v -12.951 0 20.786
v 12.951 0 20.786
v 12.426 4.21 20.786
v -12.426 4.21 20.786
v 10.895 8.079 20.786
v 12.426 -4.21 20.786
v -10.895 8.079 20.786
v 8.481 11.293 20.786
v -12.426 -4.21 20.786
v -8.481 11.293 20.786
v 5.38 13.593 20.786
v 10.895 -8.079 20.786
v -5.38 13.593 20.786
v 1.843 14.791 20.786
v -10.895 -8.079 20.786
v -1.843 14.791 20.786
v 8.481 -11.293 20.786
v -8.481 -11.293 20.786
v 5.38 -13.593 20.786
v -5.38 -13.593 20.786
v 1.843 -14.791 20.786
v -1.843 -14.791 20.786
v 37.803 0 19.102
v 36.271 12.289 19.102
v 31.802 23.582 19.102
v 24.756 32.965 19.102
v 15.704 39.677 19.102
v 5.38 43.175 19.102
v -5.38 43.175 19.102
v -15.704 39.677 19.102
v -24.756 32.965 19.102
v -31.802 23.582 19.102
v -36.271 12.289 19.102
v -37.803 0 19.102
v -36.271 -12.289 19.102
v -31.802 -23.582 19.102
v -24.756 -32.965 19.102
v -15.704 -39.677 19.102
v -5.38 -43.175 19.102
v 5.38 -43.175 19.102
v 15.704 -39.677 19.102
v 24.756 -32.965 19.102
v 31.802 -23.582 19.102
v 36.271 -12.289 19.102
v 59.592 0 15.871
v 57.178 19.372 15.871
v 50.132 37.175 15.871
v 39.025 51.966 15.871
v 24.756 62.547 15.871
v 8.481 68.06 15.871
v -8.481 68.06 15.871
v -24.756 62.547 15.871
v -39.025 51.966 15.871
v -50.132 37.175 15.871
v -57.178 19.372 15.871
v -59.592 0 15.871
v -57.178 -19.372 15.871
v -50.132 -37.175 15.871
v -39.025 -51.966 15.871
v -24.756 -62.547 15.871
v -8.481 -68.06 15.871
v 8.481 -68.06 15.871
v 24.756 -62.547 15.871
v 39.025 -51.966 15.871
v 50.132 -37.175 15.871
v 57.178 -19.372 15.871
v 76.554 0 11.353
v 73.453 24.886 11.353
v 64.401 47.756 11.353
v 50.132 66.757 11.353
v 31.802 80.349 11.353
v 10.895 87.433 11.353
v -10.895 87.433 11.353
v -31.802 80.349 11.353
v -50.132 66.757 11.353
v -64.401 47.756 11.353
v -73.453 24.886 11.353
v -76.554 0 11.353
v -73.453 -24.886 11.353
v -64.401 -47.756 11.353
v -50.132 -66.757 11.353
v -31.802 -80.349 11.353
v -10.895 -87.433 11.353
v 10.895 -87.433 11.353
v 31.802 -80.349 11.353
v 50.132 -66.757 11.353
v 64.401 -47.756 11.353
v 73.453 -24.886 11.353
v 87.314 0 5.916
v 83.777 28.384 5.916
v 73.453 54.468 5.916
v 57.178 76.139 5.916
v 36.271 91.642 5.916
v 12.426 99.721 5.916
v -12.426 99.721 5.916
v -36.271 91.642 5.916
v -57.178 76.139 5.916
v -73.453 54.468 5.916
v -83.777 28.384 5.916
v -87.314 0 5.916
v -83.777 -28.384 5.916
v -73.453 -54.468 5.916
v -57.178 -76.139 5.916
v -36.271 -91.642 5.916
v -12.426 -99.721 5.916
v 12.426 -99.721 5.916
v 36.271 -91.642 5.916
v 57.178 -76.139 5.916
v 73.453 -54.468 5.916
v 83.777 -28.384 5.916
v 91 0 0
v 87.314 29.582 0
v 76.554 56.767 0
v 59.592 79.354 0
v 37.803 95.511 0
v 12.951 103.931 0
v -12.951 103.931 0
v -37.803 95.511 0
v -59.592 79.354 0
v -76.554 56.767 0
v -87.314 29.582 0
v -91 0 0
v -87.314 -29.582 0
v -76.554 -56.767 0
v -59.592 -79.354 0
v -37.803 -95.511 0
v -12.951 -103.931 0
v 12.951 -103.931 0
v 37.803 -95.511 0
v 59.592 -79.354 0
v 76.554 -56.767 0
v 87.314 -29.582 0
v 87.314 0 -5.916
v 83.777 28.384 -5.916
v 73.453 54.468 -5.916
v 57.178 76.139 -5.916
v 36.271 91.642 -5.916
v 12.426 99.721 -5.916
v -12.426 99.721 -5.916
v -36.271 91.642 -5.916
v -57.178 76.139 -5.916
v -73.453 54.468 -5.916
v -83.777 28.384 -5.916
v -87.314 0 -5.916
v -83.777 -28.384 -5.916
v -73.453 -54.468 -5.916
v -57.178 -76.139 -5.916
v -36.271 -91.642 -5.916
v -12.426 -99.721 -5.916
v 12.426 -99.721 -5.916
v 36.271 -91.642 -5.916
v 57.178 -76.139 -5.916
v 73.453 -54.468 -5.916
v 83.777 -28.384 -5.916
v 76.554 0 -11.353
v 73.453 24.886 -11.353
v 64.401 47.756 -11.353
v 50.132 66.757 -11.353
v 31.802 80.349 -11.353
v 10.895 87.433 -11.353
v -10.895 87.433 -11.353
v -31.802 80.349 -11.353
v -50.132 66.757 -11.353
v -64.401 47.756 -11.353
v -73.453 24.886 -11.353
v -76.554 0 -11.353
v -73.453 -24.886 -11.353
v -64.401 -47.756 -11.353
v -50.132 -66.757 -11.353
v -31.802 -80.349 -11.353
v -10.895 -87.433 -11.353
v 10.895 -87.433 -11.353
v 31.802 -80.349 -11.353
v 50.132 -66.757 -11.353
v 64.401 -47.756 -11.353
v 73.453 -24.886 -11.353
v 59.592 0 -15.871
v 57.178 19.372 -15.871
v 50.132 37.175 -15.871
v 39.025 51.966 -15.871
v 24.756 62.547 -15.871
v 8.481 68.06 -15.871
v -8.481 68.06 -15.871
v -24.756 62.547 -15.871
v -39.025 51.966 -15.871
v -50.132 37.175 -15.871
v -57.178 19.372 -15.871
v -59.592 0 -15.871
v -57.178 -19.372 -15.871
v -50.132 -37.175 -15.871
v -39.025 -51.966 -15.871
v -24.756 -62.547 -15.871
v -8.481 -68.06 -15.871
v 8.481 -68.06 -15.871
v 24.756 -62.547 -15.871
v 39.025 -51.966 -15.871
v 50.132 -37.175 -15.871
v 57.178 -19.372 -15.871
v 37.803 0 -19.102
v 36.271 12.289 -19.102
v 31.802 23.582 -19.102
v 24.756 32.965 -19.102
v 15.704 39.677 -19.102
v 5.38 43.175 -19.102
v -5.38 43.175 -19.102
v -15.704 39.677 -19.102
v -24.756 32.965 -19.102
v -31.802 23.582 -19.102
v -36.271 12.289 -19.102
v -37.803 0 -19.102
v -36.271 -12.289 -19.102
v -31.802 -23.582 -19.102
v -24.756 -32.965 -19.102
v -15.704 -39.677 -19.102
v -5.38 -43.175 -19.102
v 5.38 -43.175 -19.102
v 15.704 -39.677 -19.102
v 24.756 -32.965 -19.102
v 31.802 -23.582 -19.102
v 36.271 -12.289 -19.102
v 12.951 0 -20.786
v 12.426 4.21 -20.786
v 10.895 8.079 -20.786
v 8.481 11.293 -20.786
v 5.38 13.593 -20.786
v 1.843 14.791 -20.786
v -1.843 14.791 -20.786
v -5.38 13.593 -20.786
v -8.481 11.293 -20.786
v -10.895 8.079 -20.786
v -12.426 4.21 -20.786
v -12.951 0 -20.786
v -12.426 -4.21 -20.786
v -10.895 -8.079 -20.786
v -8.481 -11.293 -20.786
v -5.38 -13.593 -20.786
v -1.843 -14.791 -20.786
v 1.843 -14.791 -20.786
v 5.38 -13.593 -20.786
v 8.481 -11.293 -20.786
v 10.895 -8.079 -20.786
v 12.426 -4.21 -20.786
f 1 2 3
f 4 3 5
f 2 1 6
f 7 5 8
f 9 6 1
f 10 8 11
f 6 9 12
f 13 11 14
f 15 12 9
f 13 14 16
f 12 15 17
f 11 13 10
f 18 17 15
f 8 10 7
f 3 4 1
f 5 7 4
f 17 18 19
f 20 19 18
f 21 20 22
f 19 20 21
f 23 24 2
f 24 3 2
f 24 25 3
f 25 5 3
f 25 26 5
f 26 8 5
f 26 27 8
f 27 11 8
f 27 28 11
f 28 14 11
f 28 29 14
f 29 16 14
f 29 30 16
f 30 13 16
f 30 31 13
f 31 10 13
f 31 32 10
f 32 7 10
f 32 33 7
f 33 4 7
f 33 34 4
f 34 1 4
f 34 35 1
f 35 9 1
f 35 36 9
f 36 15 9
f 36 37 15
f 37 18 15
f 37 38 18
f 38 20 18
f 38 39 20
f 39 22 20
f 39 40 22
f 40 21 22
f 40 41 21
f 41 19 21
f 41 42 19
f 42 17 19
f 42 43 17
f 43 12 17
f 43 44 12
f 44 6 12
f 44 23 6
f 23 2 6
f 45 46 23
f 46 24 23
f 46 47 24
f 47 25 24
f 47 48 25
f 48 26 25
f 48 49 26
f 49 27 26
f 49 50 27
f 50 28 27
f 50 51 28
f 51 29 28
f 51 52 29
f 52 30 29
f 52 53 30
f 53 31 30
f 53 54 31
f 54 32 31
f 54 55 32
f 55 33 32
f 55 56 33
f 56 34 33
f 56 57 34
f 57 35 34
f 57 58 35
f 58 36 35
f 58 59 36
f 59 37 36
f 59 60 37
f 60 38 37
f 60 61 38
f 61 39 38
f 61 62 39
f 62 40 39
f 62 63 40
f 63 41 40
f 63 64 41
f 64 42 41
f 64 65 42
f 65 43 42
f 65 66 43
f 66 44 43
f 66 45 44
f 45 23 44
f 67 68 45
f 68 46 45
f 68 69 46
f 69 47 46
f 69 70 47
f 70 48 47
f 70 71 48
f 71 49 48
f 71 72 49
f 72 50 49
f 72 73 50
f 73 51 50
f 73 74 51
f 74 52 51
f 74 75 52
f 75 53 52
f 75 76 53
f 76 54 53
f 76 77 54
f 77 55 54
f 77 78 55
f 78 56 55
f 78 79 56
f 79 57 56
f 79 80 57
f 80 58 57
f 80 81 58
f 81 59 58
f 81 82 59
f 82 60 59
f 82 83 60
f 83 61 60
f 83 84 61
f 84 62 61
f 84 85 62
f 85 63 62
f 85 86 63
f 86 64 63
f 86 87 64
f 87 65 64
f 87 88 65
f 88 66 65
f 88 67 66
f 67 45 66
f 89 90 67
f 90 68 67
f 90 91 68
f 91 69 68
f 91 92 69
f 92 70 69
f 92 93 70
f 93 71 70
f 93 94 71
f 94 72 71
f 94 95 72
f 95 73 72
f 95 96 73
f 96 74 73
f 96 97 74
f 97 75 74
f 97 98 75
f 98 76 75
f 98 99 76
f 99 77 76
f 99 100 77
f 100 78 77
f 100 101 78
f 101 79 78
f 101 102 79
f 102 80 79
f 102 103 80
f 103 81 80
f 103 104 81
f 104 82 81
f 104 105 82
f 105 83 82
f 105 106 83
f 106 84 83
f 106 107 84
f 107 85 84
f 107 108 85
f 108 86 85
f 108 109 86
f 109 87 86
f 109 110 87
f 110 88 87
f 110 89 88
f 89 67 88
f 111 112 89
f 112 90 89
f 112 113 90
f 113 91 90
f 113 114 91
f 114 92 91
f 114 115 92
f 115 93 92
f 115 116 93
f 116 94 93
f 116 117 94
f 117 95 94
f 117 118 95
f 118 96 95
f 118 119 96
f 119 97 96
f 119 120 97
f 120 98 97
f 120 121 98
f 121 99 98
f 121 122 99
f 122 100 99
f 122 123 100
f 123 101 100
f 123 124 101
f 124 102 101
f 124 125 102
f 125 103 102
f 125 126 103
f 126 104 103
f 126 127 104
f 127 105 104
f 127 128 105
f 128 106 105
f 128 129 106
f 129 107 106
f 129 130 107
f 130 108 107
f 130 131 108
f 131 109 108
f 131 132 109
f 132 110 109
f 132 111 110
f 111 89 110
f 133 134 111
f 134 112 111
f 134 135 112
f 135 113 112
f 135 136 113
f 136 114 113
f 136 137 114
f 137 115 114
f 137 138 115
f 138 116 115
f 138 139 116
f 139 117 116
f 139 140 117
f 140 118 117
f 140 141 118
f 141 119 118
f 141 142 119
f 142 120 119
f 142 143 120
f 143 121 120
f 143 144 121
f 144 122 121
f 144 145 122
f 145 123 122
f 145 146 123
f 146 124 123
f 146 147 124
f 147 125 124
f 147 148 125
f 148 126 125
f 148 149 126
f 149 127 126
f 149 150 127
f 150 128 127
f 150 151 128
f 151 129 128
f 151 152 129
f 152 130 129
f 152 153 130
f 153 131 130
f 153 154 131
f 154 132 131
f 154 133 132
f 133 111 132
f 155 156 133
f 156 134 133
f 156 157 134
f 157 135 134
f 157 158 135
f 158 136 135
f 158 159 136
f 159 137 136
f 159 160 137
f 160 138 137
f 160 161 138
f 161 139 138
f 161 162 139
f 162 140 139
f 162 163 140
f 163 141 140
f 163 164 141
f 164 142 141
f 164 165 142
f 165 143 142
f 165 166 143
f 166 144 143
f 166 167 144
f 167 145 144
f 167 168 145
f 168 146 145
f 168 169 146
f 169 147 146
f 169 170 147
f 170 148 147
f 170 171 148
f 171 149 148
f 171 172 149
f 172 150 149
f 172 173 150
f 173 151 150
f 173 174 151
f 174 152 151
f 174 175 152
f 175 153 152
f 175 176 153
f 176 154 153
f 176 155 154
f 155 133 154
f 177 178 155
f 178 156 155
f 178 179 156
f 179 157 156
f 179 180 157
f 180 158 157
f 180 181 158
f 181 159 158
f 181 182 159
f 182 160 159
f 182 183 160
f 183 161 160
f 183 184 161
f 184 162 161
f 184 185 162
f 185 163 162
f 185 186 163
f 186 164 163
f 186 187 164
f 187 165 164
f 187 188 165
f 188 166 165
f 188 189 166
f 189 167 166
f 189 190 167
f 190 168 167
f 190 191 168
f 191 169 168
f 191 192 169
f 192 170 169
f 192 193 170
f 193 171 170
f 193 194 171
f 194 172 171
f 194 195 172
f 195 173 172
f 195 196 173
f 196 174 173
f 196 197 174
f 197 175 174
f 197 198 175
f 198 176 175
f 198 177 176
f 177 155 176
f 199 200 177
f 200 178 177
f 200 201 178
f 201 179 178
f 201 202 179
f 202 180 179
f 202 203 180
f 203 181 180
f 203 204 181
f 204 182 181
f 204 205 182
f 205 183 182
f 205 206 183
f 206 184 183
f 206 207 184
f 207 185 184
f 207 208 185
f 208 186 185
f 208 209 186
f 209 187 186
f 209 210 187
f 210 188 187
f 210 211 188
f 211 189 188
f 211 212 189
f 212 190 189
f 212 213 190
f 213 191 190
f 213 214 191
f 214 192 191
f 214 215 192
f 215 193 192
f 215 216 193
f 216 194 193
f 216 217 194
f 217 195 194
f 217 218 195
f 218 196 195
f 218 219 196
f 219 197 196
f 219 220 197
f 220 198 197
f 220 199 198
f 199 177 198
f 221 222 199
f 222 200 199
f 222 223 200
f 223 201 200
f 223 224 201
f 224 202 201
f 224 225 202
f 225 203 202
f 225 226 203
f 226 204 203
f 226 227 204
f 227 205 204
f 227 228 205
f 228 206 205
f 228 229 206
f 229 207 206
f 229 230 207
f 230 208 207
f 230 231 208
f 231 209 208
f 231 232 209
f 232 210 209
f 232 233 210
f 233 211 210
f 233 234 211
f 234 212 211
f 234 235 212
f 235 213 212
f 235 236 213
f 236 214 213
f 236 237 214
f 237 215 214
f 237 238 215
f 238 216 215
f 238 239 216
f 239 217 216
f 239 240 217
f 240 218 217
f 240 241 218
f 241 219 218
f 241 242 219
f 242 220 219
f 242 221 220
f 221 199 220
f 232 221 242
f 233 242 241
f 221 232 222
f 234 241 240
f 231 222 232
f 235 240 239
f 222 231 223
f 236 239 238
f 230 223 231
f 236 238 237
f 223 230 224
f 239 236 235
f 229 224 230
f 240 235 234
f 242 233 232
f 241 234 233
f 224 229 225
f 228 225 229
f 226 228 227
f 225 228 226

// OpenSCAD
// Generated by SolidPython 1.0.1 on 2020-07-29 00:46:51


scale(v = [13, 15, 3]) {
	sphere(r = 7);
}
/***********************************************
*********      SolidPython code:      **********
************************************************
 
# import packages: SolidPython
from solid import *
from solid.utils import *
from itertools import chain, combinations, permutations


class Resize:

    def __init__(self, scad_file):
        self.scad_file = scad_file
        #self.scad_file = import_scad(scad_file)
        # cone/cylinder param:
        self.r1 = 0
        self.r2 = 0
        self.h = 0
        # rectangular prism param:
        self.w = 0
        self.l = 0
        # ellipse param:
        self.r = 0

    # import OpenScad code (file name corresponds to shape)


    # classify shape + parameters
    def assign(self, param1, param2, param3):
        if self.scad_file == 'cone.scad':
            self.r1 = param1
            self.r2 = param2
            self.h = param3
        elif self.scad_file == 'cylinder.scad':
            self.r1 = param1
            self.r2 = param2
            self.h = param3
        elif self.scad_file == 'rectangularPrism.scad':
            self.h = param1
            self.l = param2
            self.w = param3
        else:
            self.r = param1
            self.h = param2

    # resize parameters
    def iterate(self):
        x = range(3, 20, 2)
        i = 1
        if self.scad_file == 'cone.scad':
            tempList = list(permutations(x, 2))
            for temp in tempList:
                param1 = temp[0]
                param2 = temp[1]
                filepath = 'produced_scad_files/' + 'cone' + str(param1) + '_' + str(param2) + '_' + '.scad'
                scad_render_to_file(cylinder(h=param1, r1=param2, r2=0), filepath)

        elif self.scad_file == 'cylinder.scad':
            tempList = list(permutations(x, 3))
            for temp in tempList:
                param1 = temp[0]
                param2 = temp[1]
                filepath = 'produced_scad_files/' + 'cylinder' + str(param1) + '_' + str(param2) + '_' + '.scad'
                scad_render_to_file(cylinder(h=param1, r1=param2, r2=param2), filepath)

        elif self.scad_file == 'rectangularPrism.scad':
            tempList = list(permutations(x, 3))
            for temp in tempList:
                param1 = temp[0]
                param2 = temp[1]
                param3 = temp[2]
                filepath = 'produced_scad_files/' + 'rectangularPrism' + str(param1) + '_' + str(param2) + '_' + str(
                    param3) + '.scad'
                scad_render_to_file(cube(size=(param1, param2, param3)), filepath)

        elif self.scad_file == 'ellipse.scad':
            tempList = list(permutations(x, 4))
            for temp in tempList:
                param1 = temp[0]
                param2 = temp[1]
                param3 = temp[2]
                param4 = temp[3]
                filepath = 'produced_scad_files/' + 'ellipse' + str(param1) + '_' + str(param2) + '_' + str(param3) + '_' + str(param4) + '.scad'
                scad_render_to_file(scale([param1, param2, param3])(sphere(r=param4)), filepath)

    def render_to_scadfile(self):
        scad_render_to_file(scad, 'example.scad') 
 
************************************************/
